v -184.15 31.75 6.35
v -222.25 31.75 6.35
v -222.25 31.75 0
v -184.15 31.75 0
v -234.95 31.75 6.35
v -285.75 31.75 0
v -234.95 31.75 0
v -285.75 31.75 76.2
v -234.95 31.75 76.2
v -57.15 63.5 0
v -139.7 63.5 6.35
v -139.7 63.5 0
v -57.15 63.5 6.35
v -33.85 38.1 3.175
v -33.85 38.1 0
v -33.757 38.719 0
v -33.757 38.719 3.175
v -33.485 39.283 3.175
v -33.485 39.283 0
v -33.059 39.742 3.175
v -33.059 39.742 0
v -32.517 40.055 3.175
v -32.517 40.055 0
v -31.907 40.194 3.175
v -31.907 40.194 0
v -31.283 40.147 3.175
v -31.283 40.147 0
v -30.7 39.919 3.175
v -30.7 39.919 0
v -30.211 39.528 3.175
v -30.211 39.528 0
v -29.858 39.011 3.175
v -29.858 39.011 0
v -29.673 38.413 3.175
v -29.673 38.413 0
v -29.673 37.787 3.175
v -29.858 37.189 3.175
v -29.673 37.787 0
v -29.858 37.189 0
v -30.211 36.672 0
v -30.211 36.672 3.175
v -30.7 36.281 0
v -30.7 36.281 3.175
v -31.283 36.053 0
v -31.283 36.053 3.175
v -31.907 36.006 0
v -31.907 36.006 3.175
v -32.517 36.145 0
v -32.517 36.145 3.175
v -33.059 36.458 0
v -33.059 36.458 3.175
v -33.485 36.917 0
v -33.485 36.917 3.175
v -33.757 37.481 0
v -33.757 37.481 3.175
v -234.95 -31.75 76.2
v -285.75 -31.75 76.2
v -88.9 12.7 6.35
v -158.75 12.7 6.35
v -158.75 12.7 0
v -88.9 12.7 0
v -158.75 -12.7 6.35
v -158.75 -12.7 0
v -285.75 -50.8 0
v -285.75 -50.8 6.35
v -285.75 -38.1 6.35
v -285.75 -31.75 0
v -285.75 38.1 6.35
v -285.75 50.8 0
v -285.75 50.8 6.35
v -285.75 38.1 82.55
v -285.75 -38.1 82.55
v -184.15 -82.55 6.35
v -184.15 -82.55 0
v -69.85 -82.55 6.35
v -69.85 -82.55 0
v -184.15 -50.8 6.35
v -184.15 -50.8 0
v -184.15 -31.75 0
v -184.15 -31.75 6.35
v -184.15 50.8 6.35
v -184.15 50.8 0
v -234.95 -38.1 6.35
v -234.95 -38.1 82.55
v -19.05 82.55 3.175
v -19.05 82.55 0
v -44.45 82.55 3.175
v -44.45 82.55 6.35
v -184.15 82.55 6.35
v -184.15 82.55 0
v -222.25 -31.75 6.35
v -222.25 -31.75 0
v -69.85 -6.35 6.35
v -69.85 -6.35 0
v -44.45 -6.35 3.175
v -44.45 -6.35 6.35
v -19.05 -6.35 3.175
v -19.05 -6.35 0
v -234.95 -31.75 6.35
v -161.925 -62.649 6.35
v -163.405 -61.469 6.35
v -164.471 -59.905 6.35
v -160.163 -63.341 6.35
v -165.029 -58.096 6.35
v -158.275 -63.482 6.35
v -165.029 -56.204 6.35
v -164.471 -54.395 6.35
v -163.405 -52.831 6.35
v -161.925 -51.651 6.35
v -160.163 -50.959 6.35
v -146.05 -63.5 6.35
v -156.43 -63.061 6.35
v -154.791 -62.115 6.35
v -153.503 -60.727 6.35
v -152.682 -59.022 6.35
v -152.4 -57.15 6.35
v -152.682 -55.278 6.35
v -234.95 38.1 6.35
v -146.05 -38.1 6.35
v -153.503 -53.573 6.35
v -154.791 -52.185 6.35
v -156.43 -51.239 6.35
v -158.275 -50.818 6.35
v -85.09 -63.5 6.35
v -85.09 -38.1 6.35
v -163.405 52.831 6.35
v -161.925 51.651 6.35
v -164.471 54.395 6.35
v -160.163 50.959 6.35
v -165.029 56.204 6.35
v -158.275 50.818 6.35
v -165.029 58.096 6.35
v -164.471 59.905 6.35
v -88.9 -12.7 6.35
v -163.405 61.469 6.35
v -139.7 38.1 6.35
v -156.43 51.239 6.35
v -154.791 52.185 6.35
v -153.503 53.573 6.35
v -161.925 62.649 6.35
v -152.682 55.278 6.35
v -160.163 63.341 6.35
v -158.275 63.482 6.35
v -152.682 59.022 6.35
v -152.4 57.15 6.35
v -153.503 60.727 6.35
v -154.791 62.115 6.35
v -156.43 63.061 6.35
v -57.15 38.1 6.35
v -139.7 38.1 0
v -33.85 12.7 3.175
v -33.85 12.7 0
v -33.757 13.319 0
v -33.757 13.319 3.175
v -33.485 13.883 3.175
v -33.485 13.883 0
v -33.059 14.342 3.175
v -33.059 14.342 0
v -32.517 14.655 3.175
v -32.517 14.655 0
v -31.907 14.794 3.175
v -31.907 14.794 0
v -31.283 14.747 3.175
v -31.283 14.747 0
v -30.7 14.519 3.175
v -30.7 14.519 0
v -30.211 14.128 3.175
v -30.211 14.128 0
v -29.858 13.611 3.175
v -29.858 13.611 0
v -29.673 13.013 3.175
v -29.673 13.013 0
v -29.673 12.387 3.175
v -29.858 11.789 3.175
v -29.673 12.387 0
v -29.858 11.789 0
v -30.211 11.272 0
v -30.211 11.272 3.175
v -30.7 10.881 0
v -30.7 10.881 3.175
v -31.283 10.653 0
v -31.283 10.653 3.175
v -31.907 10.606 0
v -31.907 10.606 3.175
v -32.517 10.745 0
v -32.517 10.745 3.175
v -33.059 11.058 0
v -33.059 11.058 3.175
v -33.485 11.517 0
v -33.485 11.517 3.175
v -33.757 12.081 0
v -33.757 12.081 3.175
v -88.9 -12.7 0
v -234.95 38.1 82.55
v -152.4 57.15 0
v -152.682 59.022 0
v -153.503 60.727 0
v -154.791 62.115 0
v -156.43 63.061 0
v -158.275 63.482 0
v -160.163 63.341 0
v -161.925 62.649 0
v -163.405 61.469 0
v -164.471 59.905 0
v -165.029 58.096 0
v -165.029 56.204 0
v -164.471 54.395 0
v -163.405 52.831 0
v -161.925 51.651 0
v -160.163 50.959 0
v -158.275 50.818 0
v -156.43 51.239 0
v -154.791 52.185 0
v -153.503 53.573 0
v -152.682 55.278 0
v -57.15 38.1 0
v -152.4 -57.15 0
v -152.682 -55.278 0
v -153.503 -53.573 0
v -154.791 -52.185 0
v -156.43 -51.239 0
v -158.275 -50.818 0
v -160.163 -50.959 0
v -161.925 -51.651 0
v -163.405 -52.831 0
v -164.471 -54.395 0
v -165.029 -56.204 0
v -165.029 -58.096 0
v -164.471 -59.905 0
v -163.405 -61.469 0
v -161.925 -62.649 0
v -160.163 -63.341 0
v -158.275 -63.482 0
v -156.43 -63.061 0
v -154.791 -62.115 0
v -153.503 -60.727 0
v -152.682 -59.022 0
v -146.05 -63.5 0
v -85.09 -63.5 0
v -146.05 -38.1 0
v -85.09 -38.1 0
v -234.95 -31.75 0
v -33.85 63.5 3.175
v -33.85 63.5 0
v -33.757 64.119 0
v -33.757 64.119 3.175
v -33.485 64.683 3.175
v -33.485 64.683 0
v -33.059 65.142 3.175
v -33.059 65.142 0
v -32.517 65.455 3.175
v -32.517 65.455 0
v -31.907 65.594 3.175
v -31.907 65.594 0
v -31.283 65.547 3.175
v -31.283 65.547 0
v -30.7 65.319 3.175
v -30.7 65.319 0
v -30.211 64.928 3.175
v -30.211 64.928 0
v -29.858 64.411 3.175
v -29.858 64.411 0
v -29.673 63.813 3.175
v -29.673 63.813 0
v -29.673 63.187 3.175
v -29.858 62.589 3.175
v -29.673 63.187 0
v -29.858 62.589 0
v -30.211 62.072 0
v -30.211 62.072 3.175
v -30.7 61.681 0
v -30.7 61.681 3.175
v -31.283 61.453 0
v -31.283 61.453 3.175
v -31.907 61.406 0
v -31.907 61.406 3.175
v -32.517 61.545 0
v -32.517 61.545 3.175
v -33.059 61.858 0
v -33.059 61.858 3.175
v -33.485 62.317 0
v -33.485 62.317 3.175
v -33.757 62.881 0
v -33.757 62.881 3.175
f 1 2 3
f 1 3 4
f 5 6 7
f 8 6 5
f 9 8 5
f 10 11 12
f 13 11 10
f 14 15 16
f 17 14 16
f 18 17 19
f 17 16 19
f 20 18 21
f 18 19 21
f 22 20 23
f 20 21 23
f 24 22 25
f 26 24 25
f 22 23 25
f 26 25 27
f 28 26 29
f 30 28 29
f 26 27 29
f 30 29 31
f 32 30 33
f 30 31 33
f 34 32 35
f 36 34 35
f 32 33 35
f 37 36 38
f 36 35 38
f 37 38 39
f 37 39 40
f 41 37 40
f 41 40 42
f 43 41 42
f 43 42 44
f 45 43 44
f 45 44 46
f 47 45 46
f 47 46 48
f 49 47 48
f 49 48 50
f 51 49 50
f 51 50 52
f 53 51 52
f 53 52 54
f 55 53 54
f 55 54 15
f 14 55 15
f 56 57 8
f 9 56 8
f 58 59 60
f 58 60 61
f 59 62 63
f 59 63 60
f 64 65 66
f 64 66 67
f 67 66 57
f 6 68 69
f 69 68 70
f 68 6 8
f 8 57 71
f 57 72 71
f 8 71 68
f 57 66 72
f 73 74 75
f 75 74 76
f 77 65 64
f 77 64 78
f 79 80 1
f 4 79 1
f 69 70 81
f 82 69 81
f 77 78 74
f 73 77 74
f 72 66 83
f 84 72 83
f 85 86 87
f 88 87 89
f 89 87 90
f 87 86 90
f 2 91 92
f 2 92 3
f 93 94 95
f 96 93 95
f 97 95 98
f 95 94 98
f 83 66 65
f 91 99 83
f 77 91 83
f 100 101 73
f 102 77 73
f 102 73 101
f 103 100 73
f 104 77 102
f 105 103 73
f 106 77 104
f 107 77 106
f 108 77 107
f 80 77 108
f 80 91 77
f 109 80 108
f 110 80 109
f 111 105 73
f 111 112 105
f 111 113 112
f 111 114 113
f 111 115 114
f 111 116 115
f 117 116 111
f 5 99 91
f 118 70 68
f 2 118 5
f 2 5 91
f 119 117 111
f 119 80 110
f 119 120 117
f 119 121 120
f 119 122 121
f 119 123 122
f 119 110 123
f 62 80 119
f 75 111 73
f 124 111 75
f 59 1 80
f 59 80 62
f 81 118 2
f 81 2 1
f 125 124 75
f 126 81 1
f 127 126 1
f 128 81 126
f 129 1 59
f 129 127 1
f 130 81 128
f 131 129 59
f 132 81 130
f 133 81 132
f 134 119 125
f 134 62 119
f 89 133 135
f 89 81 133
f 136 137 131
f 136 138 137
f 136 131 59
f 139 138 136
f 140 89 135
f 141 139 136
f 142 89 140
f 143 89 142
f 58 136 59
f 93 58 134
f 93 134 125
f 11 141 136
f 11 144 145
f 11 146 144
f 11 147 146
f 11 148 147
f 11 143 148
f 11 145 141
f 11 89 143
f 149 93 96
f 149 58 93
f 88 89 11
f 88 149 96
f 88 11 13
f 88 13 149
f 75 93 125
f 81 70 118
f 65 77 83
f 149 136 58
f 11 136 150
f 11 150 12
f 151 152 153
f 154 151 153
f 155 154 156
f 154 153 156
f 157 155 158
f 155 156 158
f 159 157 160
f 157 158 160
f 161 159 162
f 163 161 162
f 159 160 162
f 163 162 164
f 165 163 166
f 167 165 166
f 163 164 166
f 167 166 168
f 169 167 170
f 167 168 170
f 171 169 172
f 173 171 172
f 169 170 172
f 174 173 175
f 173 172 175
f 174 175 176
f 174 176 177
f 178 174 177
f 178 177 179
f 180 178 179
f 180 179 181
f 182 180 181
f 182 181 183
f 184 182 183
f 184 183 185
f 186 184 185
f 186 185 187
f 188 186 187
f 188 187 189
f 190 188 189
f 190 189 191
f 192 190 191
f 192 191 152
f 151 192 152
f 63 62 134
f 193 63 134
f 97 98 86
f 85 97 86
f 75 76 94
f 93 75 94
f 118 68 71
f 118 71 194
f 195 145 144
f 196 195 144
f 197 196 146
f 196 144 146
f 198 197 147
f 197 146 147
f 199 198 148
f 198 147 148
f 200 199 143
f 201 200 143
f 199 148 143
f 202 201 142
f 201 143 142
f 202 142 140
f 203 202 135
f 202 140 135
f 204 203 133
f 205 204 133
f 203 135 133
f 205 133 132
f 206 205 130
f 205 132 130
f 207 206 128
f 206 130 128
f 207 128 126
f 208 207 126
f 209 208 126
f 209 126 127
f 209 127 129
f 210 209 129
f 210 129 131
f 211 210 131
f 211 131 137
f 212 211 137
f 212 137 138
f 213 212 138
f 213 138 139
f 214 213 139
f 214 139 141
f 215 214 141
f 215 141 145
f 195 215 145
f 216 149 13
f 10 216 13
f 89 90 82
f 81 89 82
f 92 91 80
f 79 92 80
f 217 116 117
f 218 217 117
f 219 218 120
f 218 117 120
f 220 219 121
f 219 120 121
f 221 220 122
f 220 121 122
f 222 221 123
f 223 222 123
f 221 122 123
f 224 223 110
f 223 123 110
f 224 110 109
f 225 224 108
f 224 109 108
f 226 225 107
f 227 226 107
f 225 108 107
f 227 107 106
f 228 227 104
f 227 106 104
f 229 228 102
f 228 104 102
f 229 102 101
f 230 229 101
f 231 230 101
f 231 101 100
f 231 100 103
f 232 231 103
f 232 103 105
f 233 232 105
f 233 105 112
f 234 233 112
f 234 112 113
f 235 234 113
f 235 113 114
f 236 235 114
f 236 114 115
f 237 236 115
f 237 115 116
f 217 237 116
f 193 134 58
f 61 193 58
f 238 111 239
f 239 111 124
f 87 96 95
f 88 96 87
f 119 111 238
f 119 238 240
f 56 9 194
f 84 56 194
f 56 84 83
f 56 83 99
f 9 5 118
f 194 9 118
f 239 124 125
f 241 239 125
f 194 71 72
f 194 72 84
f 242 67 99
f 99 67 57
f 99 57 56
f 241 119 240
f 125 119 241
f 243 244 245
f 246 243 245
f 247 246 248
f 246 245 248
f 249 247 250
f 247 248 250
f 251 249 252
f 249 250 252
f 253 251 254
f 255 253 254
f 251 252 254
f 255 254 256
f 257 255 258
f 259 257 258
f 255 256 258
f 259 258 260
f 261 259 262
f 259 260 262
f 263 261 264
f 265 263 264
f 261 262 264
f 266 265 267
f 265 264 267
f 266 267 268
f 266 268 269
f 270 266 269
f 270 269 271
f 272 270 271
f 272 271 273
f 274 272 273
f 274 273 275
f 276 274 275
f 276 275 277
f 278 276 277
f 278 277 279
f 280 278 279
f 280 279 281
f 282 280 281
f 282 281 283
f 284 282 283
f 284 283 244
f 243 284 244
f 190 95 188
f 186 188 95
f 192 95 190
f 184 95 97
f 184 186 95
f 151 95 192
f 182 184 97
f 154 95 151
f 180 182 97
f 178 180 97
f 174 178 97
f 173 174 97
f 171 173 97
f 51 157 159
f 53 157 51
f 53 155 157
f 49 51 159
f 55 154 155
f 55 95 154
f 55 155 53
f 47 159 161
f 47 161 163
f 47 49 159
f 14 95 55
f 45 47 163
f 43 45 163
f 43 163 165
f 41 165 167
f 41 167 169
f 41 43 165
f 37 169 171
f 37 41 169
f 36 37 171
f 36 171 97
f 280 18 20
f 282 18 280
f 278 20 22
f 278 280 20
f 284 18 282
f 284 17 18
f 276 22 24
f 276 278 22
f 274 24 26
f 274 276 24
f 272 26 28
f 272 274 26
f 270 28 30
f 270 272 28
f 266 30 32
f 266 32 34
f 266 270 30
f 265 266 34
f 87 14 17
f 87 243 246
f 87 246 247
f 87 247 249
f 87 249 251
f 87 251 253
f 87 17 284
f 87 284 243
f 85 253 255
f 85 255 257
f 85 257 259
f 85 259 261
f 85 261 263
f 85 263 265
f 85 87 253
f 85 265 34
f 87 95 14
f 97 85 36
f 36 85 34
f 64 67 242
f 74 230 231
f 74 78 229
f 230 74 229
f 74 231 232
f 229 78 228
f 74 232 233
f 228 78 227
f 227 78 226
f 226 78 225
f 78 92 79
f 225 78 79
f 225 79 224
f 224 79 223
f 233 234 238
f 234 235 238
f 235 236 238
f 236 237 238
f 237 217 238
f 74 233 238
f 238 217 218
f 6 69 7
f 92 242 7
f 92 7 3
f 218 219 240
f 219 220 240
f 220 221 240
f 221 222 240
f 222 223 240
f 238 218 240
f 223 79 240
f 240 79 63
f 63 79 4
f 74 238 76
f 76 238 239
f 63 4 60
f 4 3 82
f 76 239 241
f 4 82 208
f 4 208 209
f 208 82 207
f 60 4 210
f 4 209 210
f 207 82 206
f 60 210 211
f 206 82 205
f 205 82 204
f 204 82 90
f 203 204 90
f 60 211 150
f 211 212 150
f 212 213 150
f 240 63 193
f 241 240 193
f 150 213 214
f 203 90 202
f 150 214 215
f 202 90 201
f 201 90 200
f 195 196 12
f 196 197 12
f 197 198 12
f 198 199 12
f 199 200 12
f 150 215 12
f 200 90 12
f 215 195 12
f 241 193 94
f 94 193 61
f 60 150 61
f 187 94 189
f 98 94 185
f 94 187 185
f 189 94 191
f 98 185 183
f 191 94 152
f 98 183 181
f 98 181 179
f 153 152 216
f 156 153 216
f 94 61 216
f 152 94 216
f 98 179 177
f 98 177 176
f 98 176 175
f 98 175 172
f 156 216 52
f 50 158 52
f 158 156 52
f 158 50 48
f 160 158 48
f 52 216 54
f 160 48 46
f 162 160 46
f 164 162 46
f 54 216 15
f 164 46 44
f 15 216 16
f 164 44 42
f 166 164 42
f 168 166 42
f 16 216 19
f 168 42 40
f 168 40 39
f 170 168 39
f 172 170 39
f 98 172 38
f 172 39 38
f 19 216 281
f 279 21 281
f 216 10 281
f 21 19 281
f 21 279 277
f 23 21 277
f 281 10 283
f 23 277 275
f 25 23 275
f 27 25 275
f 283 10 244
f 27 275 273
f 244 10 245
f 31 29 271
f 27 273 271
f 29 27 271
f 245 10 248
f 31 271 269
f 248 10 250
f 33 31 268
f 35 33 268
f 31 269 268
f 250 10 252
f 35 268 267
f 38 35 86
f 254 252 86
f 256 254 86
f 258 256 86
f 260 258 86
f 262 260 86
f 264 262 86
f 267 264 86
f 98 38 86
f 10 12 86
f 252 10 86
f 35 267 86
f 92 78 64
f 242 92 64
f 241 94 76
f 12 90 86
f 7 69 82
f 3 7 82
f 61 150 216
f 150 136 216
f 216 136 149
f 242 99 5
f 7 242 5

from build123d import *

# Parameters (mm, degrees)
BOSS_EXTRUDE1_DEPTH       = 6.35
SKETCH5_R                 = 6.35
CUT_EXTRUDE1_DEPTH        = 202.906036314
SKETCH6_W                 = 82.55
SKETCH6_H                 = 25.4
SKETCH6_W_2               = 60.96
CUT_EXTRUDE2_DEPTH        = 10.16
M5X0_8_TAPPED_HOLE1_D     = 4.2
M5X0_8_TAPPED_HOLE1_DEPTH = 13.97
M5X0_8_TAPPED_HOLE1_TIP   = 1.2618073
SKETCH13_W                = 101.6
SKETCH13_H                = 101.6
BOSS_EXTRUDE2_DEPTH       = 6.35
SKETCH14_W                = 50.8
SKETCH14_H                = 76.2
BOSS_EXTRUDE3_DEPTH       = 76.2
SKETCH15_W                = 63.5
SKETCH15_H                = 63.5
CUT_EXTRUDE4_DEPTH        = 292.132092013
SKETCH16_W                = 25.4
SKETCH16_H                = 88.9
CUT_EXTRUDE5_DEPTH        = 3.175
SKETCH6_3_W               = 82.55
SKETCH6_3_H               = 25.4
SKETCH6_3_W_2             = 60.96
SKETCH6_3_W_3             = 69.85
CUT_EXTRUDE6_DEPTH        = 308.040722055
SKETCH17_W                = 38.1
SKETCH17_H                = 63.5
CUT_EXTRUDE7_DEPTH        = 308.040722055
SKETCH19_W                = 50.8
SKETCH19_H                = 60.96
CUT_EXTRUDE8_DEPTH        = 306.526737782
SKETCH20_W                = 50.8
SKETCH20_H                = 1.27
CUT_EXTRUDE9_DEPTH        = 306.526737782
SKETCH21_W                = 50.8
SKETCH21_H                = 1.27
CUT_EXTRUDE10_DEPTH       = 306.526737782


with BuildPart() as part:
    # Sketch2 → Boss-Extrude1 (new body)
    with BuildSketch(Plane.XY):
        Polygon((-69.85, -82.55), (-69.85, -6.35), (-19.05, -6.35), (-19.05, 82.55), (-184.15, 82.55), (-184.15, -82.55), align=None)
    extrude(amount=BOSS_EXTRUDE1_DEPTH)

    # Sketch5 → Cut-Extrude1 (cut, through all)
    with BuildSketch(Plane.XY.offset(6.35)):
        with Locations((-158.75, 57.15)):
            Circle(SKETCH5_R)
        with Locations((-158.75, -57.15)):
            Circle(SKETCH5_R)
    extrude(amount=-CUT_EXTRUDE1_DEPTH, mode=Mode.SUBTRACT)

    # Sketch6 → Cut-Extrude2 (cut)
    with BuildSketch(Plane.XY.offset(6.35)):
        with Locations((-98.425, 50.8)):
            Rectangle(SKETCH6_W, SKETCH6_H)
        with Locations((-115.57, -50.8)):
            Rectangle(SKETCH6_W_2, SKETCH6_H)
    extrude(amount=-CUT_EXTRUDE2_DEPTH, mode=Mode.SUBTRACT)

    # M5x0.8 Tapped Hole1
    with Locations(Plane.XY.offset(6.35)):
        with Locations((-31.75, 63.5), (-31.75, 38.1), (-31.75, 12.7)):
            Hole(M5X0_8_TAPPED_HOLE1_D / 2, depth=M5X0_8_TAPPED_HOLE1_DEPTH)
            with Locations((0, 0, -(M5X0_8_TAPPED_HOLE1_DEPTH + M5X0_8_TAPPED_HOLE1_TIP / 2))):  # 118° drill point
                Cone(0, M5X0_8_TAPPED_HOLE1_D / 2, M5X0_8_TAPPED_HOLE1_TIP, mode=Mode.SUBTRACT)

    # Sketch13 → Boss-Extrude2 (add)
    with BuildSketch(Plane.XY.offset(6.35)):
        with Locations((-234.95, 0)):
            Rectangle(SKETCH13_W, SKETCH13_H)
    extrude(amount=-BOSS_EXTRUDE2_DEPTH)

    # Sketch14 → Boss-Extrude3 (add)
    with BuildSketch(Plane.XY.offset(6.35)):
        with Locations((-260.35, 0)):
            Rectangle(SKETCH14_W, SKETCH14_H)
    extrude(amount=BOSS_EXTRUDE3_DEPTH)

    # Sketch15 → Cut-Extrude4 (cut, through all)
    with BuildSketch(Plane.ZY.offset(285.75)):
        with Locations((44.45, 0)):
            Rectangle(SKETCH15_W, SKETCH15_H)
    extrude(amount=-CUT_EXTRUDE4_DEPTH, mode=Mode.SUBTRACT)

    # Sketch16 → Cut-Extrude5 (cut)
    with BuildSketch(Plane.XY.offset(6.35)):
        with Locations((-31.75, 38.1)):
            Rectangle(SKETCH16_W, SKETCH16_H)
    extrude(amount=-CUT_EXTRUDE5_DEPTH, mode=Mode.SUBTRACT)

    # Sketch6<3> → Cut-Extrude6 (cut, through all)
    with BuildSketch(Plane.XY.offset(6.35)):
        with Locations((-98.425, 50.8)):
            Rectangle(SKETCH6_3_W, SKETCH6_3_H)
        with Locations((-115.57, -50.8)):
            Rectangle(SKETCH6_3_W_2, SKETCH6_3_H)
        with Locations((-123.825, 0)):
            Rectangle(SKETCH6_3_W_3, SKETCH6_3_H)
    extrude(amount=-CUT_EXTRUDE6_DEPTH, mode=Mode.SUBTRACT)

    # Sketch17 → Cut-Extrude7 (cut, through all)
    with BuildSketch(Plane.XY.offset(6.35)):
        with Locations((-203.2, 0)):
            Rectangle(SKETCH17_W, SKETCH17_H)
    extrude(amount=-CUT_EXTRUDE7_DEPTH, mode=Mode.SUBTRACT)

    # Sketch19 → Cut-Extrude8 (cut, through all)
    with BuildSketch(Plane.XY.offset(12.7)):
        with Locations((-260.35, 0)):
            Rectangle(SKETCH19_W, SKETCH19_H)
    extrude(amount=-CUT_EXTRUDE8_DEPTH, mode=Mode.SUBTRACT)

    # Sketch20 → Cut-Extrude9 (cut, through all)
    with BuildSketch(Plane.XY.offset(12.7)):
        with Locations((-260.35, 31.115)):
            Rectangle(SKETCH20_W, SKETCH20_H)
    extrude(amount=-CUT_EXTRUDE9_DEPTH, mode=Mode.SUBTRACT)

    # Sketch21 → Cut-Extrude10 (cut, through all)
    with BuildSketch(Plane.XY.offset(12.7)):
        with Locations((-260.35, -31.115)):
            Rectangle(SKETCH21_W, SKETCH21_H)
    extrude(amount=-CUT_EXTRUDE10_DEPTH, mode=Mode.SUBTRACT)


solid = part.part
